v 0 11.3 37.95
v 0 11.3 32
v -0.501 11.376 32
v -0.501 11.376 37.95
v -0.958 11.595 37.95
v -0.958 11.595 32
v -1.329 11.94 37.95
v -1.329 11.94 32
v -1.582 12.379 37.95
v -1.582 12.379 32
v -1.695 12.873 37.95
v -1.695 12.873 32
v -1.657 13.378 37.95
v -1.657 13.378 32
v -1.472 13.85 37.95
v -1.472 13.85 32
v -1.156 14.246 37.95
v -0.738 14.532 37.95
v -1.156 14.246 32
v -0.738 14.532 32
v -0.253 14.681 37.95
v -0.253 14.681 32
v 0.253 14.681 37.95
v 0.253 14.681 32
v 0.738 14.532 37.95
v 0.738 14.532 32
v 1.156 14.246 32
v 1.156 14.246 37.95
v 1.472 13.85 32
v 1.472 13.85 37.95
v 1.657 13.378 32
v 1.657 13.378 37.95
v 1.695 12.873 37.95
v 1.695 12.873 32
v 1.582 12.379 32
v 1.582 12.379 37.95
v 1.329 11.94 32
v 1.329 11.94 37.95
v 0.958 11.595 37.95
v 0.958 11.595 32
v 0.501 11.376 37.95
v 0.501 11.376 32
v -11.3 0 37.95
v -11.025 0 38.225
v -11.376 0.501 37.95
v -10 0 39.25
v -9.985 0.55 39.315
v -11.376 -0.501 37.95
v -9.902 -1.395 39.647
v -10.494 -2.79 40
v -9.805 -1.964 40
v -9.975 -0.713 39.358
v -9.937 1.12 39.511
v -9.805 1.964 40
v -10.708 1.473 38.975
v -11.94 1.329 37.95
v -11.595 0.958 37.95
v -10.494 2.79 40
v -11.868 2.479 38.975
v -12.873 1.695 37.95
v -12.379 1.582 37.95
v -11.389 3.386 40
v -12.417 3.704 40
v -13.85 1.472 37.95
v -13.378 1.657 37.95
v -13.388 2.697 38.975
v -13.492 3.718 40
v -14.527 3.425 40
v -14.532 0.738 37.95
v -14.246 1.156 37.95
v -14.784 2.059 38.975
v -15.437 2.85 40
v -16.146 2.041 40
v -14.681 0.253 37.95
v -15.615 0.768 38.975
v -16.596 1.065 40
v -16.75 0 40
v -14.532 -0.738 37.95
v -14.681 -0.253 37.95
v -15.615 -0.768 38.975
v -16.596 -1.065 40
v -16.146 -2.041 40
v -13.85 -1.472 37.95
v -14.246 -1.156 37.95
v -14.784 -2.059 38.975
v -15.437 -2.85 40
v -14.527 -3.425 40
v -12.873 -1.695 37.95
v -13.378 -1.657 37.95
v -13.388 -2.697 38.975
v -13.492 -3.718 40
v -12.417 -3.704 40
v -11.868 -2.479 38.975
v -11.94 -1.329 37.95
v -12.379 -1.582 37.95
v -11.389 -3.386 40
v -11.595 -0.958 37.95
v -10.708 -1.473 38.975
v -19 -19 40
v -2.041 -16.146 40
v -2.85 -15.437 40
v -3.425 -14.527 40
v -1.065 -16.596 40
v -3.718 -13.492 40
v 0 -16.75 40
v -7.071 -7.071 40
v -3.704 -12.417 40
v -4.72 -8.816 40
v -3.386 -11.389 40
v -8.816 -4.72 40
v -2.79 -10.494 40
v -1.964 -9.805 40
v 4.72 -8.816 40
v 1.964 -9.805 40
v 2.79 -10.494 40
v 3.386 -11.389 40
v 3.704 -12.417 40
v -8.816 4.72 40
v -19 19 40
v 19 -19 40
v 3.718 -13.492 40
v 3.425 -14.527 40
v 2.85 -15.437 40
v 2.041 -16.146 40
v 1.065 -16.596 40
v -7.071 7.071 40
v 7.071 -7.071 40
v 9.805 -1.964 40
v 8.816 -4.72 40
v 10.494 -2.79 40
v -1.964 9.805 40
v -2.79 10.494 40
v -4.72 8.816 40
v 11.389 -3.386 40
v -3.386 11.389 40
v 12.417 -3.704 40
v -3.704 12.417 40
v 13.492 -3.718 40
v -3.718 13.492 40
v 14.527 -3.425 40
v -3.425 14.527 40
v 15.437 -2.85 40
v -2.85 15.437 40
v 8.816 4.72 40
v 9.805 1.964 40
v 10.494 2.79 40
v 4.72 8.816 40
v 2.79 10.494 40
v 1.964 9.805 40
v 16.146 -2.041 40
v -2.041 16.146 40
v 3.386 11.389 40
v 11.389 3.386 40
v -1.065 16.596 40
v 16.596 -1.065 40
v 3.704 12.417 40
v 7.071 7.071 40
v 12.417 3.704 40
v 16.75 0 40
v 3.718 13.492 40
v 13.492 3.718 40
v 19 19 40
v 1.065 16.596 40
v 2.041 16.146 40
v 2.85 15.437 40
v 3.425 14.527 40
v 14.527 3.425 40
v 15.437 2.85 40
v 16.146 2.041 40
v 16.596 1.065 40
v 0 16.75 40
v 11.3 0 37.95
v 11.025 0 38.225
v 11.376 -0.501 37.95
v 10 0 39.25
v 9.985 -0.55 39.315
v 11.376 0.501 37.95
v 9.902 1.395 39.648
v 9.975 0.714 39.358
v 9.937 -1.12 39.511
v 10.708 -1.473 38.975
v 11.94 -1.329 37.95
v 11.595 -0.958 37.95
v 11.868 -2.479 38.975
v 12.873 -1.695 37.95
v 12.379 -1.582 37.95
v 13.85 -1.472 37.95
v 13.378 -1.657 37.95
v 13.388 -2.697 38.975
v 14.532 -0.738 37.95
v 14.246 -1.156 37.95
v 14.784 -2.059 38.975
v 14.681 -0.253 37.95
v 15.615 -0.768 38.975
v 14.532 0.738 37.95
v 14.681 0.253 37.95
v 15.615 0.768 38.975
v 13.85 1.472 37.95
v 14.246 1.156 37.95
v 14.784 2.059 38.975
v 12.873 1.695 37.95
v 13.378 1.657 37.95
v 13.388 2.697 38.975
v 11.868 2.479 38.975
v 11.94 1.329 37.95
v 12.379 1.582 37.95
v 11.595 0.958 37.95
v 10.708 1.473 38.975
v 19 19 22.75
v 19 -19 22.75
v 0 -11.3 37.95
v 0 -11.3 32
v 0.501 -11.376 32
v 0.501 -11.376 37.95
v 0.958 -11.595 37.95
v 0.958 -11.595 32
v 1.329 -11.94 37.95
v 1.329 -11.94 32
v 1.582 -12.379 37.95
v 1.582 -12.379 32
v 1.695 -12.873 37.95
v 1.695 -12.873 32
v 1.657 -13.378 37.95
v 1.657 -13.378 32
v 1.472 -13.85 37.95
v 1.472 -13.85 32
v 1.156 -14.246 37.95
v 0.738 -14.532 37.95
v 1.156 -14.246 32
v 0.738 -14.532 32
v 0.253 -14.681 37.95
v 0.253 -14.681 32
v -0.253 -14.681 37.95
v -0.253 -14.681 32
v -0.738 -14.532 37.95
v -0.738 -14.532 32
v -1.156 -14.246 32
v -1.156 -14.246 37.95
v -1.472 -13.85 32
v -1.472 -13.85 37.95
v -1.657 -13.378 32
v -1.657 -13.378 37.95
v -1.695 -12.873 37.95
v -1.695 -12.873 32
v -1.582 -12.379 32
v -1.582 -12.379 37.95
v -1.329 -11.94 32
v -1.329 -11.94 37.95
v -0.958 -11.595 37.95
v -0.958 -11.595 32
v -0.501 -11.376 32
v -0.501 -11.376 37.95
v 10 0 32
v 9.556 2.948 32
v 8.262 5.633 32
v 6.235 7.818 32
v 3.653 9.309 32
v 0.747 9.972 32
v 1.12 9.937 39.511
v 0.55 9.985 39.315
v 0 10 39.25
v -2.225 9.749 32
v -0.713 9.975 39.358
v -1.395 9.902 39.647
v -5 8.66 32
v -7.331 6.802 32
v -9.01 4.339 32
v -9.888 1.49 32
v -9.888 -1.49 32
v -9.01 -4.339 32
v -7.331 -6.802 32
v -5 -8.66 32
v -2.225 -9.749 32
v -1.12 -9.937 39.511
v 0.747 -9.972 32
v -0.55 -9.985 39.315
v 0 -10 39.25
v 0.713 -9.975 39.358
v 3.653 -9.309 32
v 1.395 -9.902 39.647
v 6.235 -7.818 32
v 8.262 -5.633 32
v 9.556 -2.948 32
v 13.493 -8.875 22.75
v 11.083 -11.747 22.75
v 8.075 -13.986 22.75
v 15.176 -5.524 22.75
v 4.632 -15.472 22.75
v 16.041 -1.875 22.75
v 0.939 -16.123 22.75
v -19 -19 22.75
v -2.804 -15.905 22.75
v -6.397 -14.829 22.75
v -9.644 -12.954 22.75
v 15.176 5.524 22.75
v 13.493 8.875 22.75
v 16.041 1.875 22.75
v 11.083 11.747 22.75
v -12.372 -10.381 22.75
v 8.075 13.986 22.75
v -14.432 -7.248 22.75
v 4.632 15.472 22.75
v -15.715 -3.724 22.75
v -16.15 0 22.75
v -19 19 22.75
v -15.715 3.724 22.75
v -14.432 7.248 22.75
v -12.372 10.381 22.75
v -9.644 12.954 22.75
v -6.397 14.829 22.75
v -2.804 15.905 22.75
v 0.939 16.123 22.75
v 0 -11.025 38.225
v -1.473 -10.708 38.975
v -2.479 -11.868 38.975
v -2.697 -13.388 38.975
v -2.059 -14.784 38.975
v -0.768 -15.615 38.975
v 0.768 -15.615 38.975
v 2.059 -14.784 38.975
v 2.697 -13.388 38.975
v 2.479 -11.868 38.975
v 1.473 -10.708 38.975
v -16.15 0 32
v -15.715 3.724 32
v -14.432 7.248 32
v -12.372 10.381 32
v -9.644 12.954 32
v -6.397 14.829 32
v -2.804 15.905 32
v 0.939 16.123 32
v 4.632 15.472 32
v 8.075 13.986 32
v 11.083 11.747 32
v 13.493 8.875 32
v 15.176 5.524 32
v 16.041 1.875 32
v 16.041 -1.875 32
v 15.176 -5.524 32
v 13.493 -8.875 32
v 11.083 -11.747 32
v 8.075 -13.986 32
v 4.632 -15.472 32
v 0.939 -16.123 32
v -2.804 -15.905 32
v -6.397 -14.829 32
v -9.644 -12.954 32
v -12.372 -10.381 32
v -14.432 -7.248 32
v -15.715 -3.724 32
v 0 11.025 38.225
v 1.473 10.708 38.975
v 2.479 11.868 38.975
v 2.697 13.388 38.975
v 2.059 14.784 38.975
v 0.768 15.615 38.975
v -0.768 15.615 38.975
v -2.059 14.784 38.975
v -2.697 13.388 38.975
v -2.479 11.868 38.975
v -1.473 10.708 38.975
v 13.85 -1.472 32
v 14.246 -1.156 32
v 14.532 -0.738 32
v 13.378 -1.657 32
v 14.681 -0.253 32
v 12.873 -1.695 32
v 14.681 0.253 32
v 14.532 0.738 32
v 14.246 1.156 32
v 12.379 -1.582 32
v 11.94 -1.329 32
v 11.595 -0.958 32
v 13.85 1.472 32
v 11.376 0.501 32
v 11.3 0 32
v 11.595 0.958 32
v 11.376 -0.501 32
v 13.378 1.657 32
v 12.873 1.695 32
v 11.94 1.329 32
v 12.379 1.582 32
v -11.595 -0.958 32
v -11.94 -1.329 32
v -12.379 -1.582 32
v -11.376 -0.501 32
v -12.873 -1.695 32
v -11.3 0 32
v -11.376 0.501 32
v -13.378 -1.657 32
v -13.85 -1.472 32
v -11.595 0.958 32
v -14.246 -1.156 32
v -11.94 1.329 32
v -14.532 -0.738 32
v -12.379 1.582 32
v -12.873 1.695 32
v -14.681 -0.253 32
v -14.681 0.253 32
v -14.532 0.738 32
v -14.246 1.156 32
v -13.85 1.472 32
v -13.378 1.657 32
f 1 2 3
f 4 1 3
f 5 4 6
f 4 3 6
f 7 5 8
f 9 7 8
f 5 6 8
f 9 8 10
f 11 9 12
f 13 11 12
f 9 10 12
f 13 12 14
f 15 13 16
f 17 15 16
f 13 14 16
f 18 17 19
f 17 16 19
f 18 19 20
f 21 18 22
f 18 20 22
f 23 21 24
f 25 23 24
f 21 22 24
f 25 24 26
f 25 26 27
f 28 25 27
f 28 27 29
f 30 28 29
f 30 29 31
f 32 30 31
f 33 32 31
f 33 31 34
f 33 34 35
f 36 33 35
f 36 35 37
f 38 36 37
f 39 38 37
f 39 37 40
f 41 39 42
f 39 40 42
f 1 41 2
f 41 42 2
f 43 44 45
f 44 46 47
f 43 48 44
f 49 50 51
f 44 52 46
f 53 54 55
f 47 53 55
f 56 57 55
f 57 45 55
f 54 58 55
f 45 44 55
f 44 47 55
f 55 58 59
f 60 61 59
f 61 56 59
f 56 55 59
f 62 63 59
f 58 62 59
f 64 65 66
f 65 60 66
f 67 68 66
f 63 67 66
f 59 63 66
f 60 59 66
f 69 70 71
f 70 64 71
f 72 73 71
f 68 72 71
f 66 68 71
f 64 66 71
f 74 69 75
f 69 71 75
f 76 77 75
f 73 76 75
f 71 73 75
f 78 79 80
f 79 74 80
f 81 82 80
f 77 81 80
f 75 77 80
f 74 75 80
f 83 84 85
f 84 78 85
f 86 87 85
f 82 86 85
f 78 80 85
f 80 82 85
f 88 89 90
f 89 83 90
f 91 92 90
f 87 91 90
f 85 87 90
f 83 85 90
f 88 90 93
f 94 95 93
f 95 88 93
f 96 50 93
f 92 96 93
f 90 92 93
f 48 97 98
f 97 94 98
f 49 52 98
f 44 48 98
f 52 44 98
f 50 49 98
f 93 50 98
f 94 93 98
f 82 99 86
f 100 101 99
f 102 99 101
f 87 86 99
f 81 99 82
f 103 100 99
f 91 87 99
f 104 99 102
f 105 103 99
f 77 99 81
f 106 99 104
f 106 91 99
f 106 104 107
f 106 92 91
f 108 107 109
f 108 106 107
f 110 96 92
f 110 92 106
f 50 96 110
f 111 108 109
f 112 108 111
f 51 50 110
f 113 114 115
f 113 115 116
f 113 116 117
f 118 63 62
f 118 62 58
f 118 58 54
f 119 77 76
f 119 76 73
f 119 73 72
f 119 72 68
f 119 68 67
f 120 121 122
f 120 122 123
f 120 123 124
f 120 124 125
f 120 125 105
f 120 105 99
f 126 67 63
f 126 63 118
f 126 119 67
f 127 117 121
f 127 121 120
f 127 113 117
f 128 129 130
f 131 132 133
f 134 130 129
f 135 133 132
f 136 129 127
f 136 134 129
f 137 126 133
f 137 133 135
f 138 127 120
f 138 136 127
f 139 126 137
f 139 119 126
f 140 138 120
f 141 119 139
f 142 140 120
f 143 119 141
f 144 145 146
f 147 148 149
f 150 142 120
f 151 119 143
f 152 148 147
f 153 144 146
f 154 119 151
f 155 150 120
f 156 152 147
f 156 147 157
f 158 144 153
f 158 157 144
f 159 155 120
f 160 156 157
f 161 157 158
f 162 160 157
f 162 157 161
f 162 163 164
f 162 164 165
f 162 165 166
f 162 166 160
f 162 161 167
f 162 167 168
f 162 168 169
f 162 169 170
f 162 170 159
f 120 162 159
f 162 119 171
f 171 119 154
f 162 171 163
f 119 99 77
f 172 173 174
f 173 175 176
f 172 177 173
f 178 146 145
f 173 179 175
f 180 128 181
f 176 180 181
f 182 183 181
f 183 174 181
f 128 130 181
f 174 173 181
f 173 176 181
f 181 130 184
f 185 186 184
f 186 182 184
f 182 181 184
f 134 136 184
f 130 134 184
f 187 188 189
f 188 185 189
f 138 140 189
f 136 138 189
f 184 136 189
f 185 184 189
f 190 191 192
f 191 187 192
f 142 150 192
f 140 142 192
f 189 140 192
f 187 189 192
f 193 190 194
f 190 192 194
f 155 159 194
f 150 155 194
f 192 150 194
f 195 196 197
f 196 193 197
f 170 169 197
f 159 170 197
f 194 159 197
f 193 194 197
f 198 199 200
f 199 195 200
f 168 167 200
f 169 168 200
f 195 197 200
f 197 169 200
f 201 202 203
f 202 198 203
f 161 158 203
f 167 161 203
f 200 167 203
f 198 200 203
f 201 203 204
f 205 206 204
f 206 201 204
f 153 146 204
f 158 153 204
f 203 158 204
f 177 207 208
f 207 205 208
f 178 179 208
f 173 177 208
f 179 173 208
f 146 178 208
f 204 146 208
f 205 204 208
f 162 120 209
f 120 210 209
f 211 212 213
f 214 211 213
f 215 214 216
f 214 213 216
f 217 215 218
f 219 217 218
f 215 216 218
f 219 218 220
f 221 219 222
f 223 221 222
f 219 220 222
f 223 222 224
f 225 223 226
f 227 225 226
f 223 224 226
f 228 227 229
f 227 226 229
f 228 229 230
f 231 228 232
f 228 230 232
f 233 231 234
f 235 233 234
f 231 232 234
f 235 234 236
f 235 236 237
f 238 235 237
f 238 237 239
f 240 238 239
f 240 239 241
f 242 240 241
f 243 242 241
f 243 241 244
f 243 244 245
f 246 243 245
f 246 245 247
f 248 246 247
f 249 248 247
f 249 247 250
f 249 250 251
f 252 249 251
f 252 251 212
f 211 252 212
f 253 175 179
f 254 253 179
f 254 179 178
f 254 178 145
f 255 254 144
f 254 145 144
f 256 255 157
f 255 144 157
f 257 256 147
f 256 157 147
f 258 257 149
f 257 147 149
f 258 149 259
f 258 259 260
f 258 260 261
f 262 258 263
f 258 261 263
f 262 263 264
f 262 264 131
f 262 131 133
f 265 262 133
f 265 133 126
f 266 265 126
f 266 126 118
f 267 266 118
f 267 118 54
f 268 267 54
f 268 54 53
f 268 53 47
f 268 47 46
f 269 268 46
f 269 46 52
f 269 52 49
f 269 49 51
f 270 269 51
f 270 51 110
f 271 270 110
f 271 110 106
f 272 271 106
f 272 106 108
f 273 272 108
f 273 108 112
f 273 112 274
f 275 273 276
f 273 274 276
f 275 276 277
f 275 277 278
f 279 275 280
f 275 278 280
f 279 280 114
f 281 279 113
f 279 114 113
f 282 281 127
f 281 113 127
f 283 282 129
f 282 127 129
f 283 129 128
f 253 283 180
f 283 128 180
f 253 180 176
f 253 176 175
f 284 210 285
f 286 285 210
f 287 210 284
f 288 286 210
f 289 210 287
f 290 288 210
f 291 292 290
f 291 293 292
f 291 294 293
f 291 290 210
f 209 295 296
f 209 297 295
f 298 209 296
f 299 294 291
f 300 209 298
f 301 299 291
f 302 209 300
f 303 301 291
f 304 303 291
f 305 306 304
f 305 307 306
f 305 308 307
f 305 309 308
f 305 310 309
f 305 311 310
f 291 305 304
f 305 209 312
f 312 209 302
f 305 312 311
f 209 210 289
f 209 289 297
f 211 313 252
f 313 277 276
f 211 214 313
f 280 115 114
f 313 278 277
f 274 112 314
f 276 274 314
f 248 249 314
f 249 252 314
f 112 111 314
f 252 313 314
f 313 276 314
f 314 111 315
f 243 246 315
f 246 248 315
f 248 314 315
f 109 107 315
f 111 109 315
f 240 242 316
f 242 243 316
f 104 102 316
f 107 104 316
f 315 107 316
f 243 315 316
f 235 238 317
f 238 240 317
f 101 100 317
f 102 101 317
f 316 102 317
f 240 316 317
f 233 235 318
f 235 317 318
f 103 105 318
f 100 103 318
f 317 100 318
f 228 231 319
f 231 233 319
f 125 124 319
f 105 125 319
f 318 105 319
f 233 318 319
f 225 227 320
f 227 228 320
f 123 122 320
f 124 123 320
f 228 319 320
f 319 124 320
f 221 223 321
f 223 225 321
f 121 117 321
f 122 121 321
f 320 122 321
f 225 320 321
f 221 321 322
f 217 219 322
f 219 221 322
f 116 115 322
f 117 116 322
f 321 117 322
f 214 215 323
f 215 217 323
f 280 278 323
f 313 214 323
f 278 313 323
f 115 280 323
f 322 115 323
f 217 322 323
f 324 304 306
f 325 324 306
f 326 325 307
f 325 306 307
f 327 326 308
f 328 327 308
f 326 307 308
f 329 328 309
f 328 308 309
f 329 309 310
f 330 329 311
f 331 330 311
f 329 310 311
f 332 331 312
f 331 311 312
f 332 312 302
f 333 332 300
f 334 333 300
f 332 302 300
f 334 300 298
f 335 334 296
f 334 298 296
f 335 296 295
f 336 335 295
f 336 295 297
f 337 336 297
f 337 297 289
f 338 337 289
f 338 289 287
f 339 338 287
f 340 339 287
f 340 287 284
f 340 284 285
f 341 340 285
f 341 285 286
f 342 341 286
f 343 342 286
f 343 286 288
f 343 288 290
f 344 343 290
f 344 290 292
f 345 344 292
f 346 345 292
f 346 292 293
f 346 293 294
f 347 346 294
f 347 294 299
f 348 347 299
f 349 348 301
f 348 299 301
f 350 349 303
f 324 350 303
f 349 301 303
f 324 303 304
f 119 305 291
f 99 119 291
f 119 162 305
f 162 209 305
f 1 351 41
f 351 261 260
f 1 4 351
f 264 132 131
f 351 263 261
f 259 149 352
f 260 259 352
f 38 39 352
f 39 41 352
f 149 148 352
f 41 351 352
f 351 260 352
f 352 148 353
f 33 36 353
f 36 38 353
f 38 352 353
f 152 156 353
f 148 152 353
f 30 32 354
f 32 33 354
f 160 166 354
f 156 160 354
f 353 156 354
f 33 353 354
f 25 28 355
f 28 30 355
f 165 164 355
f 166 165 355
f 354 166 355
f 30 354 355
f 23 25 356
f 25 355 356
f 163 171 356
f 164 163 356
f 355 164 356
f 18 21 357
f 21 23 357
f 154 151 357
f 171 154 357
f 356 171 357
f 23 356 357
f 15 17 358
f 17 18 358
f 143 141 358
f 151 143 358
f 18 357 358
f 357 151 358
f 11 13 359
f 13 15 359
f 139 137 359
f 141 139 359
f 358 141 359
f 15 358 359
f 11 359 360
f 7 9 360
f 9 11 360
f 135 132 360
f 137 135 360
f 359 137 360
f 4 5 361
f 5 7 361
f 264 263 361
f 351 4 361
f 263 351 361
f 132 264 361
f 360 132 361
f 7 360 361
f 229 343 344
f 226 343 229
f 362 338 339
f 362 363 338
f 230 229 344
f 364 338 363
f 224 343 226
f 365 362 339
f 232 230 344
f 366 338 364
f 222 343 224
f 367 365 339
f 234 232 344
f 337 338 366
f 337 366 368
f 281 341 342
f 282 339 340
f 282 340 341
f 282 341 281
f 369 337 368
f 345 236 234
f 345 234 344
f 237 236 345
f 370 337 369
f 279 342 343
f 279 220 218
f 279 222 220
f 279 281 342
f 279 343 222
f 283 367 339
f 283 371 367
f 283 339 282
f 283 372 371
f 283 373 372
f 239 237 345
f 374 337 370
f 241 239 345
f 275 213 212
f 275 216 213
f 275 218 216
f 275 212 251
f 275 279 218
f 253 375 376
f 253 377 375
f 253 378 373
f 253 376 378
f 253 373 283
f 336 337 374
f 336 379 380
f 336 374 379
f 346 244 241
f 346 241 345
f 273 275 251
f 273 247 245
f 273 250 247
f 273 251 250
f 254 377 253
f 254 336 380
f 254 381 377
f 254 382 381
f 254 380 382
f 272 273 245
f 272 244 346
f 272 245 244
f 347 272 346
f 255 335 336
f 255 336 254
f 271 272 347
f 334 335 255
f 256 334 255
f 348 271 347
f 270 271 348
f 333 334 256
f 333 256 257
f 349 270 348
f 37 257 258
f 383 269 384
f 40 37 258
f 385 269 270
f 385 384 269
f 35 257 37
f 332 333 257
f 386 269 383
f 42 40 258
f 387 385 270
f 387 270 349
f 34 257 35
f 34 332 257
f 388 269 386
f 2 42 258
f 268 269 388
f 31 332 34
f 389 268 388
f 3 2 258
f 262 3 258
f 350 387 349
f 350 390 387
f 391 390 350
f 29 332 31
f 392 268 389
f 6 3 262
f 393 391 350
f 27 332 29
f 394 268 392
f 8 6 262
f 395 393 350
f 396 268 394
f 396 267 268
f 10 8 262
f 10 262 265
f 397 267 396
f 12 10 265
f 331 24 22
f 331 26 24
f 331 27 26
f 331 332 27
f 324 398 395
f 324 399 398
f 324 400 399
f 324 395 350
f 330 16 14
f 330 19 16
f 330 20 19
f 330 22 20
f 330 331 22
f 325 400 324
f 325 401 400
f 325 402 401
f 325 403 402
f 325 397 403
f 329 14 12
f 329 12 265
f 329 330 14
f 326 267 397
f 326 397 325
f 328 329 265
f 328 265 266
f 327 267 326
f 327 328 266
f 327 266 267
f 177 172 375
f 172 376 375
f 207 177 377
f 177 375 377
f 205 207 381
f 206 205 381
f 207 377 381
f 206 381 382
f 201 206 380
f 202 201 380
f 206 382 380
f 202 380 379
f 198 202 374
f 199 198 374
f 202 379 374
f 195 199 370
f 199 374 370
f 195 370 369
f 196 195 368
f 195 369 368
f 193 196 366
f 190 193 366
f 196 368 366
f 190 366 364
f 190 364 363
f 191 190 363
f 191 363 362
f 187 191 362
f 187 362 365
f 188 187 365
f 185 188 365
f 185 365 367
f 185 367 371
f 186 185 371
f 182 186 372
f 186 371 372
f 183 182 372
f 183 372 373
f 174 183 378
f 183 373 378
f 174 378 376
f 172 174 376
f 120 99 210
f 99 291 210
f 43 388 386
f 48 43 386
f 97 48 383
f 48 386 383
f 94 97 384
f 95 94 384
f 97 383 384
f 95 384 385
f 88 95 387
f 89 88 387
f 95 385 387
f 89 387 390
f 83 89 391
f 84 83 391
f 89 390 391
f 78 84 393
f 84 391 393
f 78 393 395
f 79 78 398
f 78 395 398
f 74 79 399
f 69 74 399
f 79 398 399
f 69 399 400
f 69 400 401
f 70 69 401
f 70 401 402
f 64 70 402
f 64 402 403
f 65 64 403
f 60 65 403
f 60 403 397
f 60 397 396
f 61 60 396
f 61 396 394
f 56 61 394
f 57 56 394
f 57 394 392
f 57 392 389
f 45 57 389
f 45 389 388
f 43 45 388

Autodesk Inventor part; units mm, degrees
ref_plane "YZ Plane" through (0, 0, 0) normal (1, 0, 0) x (0, 1, 0)
ref_plane "XZ Plane" through (0, 0, 0) normal (0, 1, 0) x (-1, 0, 0)
ref_plane "XY Plane" through (0, 0, 0) normal (0, 0, 1) x (1, 0, 0)
sketch "Sketch1" plane through (0, 0, 0) normal (0, 0, 1) x (1, 0, 0)
  line L0 (-19, -19) -> (19, -19)
  line L1 (19, -19) -> (19, 19)
  line L2 (19, 19) -> (-19, 19)
  line L3 (-19, 19) -> (-19, -19)
  line L4 (-19, -19) -> (19, 19) construction
  line L5 (19, -19) -> (-19, 19) construction
  point P0 (0, 0)
  dimension "d0" = 38
extrude "Extrusion1" add sketch "Sketch1" along normal blind 100
sketch "Sketch2" plane through (0, 0, 0) normal (0, 0, -1) x (-1, 0, 0)
  circle A0 centre (0, 0) radius 16.15
  dimension "d3" = 32.3
extrude "Extrusion2" cut sketch "Sketch2" against normal blind 32
sketch "Sketch3" plane through (0, 0, 100) normal (0, 0, 1) x (1, 0, 0)
  circle A0 centre (0, 0) radius 17
  dimension "d6" = 34
extrude "Extrusion3" cut sketch "Sketch3" against normal blind 60
sketch "Sketch4" plane through (0, 0, 40) normal (0, 0, 1) x (1, 0, 0)
  circle A0 centre (0, 0) radius 10
  dimension "d9" = 20
extrude "Extrusion4" cut sketch "Sketch4" against normal through all
sketch "Sketch5" plane through (0, 0, 40) normal (0, 0, 1) x (1, 0, 0)
  point P0 (0, 0)
  point P1 (0, 13)
  dimension "d12" = 13
hole "Hole1" at (0, 13, 40) direction (0, 0, -1) diameter 3.4 end through all countersink diameter 7.5 countersink angle 90 clearance for "Countersunk Flat Head Hex Socket Screw DIN EN ISO 10642" size "M3" standard "DIN"
pattern_circular "Circular Pattern1" count 4 over 360 about axis through (0, 0, -10) along (0, 0, 1) of "Hole1"
sketch "Sketch6" plane through (0, 0, 100) normal (0, 0, 1) x (1, 0, 0)
  line L0 (26.1087, -24.9255) -> (-24.3734, -24.9255)
  line L1 (-24.3734, -24.9255) -> (-24.3734, 25.8721)
  line L2 (-24.3734, 25.8721) -> (26.1087, 25.8721)
  line L3 (26.1087, 25.8721) -> (26.1087, -24.9255)
  point P0 (0, 0)
extrude "Extrusion5" cut sketch "Sketch6" against normal up to surface (60 mm away)
sketch "Sketch7" plane through (0, 0, 0) normal (0, 0, -1) x (-1, 0, 0)
  line L0 (21.4324, -23.2888) -> (-21.2074, -23.2888)
  line L1 (-21.2074, -23.2888) -> (-21.2074, 21.7137)
  line L2 (-21.2074, 21.7137) -> (21.4324, 21.7137)
  line L3 (21.4324, 21.7137) -> (21.4324, -23.2888)
  point P0 (0, 0)
extrude "Extrusion6" cut sketch "Sketch7" against normal blind 22.75
properties part number "402-gearbox-housing"
